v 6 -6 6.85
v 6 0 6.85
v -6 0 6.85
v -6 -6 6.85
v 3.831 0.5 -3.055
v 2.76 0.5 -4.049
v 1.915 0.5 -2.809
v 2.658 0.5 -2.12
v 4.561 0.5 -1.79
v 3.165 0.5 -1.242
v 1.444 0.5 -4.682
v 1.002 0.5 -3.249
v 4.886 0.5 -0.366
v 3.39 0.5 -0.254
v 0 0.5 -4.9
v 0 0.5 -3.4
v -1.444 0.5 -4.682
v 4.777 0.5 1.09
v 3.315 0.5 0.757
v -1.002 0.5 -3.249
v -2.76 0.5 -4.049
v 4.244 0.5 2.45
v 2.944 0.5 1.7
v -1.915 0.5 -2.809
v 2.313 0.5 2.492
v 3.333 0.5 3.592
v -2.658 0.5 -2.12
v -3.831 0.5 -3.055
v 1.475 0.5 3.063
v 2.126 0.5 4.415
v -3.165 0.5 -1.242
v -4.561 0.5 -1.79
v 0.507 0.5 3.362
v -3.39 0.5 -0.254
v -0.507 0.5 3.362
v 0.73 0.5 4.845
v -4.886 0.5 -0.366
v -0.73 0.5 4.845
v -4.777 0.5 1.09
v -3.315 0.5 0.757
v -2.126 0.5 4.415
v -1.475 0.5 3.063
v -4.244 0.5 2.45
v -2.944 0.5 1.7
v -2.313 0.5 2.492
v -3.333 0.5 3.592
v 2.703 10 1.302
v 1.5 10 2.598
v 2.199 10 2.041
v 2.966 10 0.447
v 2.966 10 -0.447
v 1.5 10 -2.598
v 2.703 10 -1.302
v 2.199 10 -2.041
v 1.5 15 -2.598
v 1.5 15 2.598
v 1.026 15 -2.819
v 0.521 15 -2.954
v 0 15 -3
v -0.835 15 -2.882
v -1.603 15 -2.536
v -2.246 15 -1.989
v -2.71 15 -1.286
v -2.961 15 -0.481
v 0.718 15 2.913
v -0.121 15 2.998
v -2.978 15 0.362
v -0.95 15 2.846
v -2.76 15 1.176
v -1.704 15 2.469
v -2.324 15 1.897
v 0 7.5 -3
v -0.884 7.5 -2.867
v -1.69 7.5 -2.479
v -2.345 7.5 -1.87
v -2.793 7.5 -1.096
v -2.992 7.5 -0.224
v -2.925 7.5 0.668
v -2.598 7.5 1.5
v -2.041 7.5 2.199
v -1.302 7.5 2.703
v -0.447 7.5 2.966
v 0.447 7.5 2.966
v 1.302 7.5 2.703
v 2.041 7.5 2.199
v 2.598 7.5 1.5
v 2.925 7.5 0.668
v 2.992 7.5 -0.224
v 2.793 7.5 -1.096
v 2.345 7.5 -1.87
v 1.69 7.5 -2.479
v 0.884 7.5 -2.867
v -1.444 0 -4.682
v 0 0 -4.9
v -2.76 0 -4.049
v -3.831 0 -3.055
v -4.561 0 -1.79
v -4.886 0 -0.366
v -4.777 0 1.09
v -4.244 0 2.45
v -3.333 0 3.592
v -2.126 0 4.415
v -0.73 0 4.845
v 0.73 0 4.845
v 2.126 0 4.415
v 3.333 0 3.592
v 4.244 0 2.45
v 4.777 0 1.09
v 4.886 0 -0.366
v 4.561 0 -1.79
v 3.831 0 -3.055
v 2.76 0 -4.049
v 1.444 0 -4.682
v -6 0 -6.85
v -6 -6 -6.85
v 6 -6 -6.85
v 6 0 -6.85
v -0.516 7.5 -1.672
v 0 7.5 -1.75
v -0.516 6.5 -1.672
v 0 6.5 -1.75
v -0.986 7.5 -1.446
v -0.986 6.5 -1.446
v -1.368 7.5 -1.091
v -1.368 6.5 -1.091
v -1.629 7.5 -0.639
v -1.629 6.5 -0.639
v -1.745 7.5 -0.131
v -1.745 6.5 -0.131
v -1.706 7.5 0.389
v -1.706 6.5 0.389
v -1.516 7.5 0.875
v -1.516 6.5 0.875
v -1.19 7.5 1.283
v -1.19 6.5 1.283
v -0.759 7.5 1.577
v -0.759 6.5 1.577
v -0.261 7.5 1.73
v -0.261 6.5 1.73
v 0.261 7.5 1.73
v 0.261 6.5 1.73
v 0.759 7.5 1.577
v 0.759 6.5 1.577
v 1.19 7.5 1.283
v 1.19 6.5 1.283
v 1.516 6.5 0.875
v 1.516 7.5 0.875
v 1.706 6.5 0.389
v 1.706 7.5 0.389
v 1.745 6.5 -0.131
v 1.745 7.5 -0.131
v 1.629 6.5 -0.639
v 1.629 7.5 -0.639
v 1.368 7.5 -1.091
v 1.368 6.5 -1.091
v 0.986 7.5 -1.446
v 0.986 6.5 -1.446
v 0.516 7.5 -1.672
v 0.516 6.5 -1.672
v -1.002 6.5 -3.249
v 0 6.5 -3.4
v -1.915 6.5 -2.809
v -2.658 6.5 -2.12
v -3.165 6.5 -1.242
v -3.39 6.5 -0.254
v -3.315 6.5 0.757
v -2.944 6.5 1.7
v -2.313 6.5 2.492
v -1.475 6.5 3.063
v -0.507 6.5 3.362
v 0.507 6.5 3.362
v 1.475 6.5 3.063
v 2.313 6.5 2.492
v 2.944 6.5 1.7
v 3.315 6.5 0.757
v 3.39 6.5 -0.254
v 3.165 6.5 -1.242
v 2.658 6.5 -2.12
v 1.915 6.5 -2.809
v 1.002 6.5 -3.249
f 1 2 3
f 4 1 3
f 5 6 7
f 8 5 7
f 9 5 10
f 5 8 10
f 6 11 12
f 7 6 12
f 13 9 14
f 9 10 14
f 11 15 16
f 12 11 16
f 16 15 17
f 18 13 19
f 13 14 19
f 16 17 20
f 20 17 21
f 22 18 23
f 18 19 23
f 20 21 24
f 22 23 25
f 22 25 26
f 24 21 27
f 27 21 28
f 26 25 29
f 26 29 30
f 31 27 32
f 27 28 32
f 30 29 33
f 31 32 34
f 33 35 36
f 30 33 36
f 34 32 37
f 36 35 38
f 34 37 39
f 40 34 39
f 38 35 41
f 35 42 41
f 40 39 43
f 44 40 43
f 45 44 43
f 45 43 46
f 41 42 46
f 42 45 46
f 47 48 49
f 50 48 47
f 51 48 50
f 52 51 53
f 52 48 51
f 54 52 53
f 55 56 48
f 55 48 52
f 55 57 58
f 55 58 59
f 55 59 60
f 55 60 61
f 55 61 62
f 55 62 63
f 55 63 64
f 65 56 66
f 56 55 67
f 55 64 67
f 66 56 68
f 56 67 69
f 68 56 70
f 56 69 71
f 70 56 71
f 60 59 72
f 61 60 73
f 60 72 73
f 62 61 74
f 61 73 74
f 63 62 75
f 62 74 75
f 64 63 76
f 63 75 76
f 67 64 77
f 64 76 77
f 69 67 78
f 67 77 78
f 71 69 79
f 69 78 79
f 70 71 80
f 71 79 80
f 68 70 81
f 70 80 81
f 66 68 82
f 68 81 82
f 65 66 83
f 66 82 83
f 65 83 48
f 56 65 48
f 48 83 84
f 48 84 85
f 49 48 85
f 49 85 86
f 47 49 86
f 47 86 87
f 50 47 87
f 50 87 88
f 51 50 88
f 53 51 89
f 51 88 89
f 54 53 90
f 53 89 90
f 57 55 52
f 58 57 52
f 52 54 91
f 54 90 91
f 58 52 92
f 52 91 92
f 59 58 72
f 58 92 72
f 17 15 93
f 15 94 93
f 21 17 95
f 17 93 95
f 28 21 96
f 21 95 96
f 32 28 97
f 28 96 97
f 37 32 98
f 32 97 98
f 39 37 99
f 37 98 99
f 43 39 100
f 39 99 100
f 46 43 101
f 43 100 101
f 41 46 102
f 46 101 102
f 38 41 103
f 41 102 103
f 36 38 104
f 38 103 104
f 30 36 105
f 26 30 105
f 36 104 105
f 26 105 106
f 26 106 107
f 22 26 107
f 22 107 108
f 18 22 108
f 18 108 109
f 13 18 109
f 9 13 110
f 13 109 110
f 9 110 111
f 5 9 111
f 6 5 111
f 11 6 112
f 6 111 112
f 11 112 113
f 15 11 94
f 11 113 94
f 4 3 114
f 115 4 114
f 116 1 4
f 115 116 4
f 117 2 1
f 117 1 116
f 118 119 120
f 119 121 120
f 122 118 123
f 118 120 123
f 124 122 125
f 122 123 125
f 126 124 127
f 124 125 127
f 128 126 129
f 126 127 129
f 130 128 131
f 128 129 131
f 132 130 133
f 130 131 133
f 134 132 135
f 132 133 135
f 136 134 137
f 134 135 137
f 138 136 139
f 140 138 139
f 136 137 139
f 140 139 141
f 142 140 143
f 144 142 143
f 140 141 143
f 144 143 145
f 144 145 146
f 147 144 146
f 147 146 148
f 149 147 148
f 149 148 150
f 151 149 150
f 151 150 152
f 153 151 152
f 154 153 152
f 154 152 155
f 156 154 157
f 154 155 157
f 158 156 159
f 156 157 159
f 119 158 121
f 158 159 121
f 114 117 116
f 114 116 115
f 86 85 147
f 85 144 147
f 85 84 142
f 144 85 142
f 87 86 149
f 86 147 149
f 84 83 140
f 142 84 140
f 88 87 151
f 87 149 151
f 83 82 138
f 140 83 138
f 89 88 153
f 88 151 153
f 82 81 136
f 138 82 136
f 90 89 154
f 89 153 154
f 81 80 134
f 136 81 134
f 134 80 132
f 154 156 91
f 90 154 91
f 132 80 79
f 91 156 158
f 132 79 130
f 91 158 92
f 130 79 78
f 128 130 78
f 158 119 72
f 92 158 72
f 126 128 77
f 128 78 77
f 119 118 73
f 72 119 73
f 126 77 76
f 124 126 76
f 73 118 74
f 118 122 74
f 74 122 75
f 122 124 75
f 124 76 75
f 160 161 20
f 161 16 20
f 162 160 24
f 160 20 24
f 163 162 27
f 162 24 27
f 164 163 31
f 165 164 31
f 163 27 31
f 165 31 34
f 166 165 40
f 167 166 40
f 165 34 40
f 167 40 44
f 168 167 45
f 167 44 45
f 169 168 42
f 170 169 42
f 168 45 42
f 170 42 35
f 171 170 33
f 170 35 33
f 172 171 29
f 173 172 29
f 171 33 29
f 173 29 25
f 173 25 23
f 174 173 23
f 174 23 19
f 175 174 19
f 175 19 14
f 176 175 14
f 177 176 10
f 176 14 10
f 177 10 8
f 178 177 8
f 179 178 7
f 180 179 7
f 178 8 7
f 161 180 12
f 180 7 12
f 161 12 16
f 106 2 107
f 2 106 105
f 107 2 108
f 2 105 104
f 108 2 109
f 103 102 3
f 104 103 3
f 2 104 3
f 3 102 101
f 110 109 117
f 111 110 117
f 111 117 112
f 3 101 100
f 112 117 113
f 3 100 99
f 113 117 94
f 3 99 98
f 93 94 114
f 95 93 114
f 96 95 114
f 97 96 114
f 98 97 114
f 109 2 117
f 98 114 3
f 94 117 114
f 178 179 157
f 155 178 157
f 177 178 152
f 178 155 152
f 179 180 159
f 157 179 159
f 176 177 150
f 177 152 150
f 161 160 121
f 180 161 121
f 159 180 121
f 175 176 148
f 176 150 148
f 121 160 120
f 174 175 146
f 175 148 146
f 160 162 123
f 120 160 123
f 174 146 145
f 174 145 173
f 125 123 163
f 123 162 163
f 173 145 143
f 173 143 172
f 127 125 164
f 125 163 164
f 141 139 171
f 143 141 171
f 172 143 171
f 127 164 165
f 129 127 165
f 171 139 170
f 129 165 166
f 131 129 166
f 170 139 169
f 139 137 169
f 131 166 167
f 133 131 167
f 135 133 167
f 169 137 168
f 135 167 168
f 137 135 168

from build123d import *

# Parameters (mm, degrees)
SKETCH2_W           = 3
SKETCH2_H           = 5.196152422
CUT_EXTRUDE1_DEPTH  = 5
SKETCH3_W           = 12
SKETCH3_H           = 13.7
BOSS_EXTRUDE1_DEPTH = 6


with BuildPart() as part:
    # Sketch1 → Revolve1 (revolve)
    with BuildSketch(Plane.XY, mode=Mode.PRIVATE) as revolve1_sk:
        Polygon((0, 15), (-3, 15), (-3, 7.5), (-1.75, 7.5), (-1.75, 6.5), (-3.4, 6.5), (-3.4, 0.5), (-4.9, 0.5), (-4.9, 0), (0, 0), align=None)
    revolve(revolve1_sk.sketch.rotate(Axis((0, 0, 0), (0, 1, 0)), 270), axis=Axis((0, 0, 0), (0, 1, 0)))

    # Sketch2 → Cut-Extrude1 (cut)
    with BuildSketch(Plane(origin=(0, 15, 0), x_dir=(1, 0, 0), z_dir=(0, 1, 0))):
        with Locations((3, 0)):
            Rectangle(SKETCH2_W, SKETCH2_H)
    extrude(amount=-CUT_EXTRUDE1_DEPTH, mode=Mode.SUBTRACT)

    # Sketch3 → Boss-Extrude1 (add)
    with BuildSketch(Plane(origin=(0, 0, 0), x_dir=(-1, 0, 0), z_dir=(0, -1, 0))):
        Rectangle(SKETCH3_W, SKETCH3_H)
    extrude(amount=BOSS_EXTRUDE1_DEPTH)


solid = part.part
